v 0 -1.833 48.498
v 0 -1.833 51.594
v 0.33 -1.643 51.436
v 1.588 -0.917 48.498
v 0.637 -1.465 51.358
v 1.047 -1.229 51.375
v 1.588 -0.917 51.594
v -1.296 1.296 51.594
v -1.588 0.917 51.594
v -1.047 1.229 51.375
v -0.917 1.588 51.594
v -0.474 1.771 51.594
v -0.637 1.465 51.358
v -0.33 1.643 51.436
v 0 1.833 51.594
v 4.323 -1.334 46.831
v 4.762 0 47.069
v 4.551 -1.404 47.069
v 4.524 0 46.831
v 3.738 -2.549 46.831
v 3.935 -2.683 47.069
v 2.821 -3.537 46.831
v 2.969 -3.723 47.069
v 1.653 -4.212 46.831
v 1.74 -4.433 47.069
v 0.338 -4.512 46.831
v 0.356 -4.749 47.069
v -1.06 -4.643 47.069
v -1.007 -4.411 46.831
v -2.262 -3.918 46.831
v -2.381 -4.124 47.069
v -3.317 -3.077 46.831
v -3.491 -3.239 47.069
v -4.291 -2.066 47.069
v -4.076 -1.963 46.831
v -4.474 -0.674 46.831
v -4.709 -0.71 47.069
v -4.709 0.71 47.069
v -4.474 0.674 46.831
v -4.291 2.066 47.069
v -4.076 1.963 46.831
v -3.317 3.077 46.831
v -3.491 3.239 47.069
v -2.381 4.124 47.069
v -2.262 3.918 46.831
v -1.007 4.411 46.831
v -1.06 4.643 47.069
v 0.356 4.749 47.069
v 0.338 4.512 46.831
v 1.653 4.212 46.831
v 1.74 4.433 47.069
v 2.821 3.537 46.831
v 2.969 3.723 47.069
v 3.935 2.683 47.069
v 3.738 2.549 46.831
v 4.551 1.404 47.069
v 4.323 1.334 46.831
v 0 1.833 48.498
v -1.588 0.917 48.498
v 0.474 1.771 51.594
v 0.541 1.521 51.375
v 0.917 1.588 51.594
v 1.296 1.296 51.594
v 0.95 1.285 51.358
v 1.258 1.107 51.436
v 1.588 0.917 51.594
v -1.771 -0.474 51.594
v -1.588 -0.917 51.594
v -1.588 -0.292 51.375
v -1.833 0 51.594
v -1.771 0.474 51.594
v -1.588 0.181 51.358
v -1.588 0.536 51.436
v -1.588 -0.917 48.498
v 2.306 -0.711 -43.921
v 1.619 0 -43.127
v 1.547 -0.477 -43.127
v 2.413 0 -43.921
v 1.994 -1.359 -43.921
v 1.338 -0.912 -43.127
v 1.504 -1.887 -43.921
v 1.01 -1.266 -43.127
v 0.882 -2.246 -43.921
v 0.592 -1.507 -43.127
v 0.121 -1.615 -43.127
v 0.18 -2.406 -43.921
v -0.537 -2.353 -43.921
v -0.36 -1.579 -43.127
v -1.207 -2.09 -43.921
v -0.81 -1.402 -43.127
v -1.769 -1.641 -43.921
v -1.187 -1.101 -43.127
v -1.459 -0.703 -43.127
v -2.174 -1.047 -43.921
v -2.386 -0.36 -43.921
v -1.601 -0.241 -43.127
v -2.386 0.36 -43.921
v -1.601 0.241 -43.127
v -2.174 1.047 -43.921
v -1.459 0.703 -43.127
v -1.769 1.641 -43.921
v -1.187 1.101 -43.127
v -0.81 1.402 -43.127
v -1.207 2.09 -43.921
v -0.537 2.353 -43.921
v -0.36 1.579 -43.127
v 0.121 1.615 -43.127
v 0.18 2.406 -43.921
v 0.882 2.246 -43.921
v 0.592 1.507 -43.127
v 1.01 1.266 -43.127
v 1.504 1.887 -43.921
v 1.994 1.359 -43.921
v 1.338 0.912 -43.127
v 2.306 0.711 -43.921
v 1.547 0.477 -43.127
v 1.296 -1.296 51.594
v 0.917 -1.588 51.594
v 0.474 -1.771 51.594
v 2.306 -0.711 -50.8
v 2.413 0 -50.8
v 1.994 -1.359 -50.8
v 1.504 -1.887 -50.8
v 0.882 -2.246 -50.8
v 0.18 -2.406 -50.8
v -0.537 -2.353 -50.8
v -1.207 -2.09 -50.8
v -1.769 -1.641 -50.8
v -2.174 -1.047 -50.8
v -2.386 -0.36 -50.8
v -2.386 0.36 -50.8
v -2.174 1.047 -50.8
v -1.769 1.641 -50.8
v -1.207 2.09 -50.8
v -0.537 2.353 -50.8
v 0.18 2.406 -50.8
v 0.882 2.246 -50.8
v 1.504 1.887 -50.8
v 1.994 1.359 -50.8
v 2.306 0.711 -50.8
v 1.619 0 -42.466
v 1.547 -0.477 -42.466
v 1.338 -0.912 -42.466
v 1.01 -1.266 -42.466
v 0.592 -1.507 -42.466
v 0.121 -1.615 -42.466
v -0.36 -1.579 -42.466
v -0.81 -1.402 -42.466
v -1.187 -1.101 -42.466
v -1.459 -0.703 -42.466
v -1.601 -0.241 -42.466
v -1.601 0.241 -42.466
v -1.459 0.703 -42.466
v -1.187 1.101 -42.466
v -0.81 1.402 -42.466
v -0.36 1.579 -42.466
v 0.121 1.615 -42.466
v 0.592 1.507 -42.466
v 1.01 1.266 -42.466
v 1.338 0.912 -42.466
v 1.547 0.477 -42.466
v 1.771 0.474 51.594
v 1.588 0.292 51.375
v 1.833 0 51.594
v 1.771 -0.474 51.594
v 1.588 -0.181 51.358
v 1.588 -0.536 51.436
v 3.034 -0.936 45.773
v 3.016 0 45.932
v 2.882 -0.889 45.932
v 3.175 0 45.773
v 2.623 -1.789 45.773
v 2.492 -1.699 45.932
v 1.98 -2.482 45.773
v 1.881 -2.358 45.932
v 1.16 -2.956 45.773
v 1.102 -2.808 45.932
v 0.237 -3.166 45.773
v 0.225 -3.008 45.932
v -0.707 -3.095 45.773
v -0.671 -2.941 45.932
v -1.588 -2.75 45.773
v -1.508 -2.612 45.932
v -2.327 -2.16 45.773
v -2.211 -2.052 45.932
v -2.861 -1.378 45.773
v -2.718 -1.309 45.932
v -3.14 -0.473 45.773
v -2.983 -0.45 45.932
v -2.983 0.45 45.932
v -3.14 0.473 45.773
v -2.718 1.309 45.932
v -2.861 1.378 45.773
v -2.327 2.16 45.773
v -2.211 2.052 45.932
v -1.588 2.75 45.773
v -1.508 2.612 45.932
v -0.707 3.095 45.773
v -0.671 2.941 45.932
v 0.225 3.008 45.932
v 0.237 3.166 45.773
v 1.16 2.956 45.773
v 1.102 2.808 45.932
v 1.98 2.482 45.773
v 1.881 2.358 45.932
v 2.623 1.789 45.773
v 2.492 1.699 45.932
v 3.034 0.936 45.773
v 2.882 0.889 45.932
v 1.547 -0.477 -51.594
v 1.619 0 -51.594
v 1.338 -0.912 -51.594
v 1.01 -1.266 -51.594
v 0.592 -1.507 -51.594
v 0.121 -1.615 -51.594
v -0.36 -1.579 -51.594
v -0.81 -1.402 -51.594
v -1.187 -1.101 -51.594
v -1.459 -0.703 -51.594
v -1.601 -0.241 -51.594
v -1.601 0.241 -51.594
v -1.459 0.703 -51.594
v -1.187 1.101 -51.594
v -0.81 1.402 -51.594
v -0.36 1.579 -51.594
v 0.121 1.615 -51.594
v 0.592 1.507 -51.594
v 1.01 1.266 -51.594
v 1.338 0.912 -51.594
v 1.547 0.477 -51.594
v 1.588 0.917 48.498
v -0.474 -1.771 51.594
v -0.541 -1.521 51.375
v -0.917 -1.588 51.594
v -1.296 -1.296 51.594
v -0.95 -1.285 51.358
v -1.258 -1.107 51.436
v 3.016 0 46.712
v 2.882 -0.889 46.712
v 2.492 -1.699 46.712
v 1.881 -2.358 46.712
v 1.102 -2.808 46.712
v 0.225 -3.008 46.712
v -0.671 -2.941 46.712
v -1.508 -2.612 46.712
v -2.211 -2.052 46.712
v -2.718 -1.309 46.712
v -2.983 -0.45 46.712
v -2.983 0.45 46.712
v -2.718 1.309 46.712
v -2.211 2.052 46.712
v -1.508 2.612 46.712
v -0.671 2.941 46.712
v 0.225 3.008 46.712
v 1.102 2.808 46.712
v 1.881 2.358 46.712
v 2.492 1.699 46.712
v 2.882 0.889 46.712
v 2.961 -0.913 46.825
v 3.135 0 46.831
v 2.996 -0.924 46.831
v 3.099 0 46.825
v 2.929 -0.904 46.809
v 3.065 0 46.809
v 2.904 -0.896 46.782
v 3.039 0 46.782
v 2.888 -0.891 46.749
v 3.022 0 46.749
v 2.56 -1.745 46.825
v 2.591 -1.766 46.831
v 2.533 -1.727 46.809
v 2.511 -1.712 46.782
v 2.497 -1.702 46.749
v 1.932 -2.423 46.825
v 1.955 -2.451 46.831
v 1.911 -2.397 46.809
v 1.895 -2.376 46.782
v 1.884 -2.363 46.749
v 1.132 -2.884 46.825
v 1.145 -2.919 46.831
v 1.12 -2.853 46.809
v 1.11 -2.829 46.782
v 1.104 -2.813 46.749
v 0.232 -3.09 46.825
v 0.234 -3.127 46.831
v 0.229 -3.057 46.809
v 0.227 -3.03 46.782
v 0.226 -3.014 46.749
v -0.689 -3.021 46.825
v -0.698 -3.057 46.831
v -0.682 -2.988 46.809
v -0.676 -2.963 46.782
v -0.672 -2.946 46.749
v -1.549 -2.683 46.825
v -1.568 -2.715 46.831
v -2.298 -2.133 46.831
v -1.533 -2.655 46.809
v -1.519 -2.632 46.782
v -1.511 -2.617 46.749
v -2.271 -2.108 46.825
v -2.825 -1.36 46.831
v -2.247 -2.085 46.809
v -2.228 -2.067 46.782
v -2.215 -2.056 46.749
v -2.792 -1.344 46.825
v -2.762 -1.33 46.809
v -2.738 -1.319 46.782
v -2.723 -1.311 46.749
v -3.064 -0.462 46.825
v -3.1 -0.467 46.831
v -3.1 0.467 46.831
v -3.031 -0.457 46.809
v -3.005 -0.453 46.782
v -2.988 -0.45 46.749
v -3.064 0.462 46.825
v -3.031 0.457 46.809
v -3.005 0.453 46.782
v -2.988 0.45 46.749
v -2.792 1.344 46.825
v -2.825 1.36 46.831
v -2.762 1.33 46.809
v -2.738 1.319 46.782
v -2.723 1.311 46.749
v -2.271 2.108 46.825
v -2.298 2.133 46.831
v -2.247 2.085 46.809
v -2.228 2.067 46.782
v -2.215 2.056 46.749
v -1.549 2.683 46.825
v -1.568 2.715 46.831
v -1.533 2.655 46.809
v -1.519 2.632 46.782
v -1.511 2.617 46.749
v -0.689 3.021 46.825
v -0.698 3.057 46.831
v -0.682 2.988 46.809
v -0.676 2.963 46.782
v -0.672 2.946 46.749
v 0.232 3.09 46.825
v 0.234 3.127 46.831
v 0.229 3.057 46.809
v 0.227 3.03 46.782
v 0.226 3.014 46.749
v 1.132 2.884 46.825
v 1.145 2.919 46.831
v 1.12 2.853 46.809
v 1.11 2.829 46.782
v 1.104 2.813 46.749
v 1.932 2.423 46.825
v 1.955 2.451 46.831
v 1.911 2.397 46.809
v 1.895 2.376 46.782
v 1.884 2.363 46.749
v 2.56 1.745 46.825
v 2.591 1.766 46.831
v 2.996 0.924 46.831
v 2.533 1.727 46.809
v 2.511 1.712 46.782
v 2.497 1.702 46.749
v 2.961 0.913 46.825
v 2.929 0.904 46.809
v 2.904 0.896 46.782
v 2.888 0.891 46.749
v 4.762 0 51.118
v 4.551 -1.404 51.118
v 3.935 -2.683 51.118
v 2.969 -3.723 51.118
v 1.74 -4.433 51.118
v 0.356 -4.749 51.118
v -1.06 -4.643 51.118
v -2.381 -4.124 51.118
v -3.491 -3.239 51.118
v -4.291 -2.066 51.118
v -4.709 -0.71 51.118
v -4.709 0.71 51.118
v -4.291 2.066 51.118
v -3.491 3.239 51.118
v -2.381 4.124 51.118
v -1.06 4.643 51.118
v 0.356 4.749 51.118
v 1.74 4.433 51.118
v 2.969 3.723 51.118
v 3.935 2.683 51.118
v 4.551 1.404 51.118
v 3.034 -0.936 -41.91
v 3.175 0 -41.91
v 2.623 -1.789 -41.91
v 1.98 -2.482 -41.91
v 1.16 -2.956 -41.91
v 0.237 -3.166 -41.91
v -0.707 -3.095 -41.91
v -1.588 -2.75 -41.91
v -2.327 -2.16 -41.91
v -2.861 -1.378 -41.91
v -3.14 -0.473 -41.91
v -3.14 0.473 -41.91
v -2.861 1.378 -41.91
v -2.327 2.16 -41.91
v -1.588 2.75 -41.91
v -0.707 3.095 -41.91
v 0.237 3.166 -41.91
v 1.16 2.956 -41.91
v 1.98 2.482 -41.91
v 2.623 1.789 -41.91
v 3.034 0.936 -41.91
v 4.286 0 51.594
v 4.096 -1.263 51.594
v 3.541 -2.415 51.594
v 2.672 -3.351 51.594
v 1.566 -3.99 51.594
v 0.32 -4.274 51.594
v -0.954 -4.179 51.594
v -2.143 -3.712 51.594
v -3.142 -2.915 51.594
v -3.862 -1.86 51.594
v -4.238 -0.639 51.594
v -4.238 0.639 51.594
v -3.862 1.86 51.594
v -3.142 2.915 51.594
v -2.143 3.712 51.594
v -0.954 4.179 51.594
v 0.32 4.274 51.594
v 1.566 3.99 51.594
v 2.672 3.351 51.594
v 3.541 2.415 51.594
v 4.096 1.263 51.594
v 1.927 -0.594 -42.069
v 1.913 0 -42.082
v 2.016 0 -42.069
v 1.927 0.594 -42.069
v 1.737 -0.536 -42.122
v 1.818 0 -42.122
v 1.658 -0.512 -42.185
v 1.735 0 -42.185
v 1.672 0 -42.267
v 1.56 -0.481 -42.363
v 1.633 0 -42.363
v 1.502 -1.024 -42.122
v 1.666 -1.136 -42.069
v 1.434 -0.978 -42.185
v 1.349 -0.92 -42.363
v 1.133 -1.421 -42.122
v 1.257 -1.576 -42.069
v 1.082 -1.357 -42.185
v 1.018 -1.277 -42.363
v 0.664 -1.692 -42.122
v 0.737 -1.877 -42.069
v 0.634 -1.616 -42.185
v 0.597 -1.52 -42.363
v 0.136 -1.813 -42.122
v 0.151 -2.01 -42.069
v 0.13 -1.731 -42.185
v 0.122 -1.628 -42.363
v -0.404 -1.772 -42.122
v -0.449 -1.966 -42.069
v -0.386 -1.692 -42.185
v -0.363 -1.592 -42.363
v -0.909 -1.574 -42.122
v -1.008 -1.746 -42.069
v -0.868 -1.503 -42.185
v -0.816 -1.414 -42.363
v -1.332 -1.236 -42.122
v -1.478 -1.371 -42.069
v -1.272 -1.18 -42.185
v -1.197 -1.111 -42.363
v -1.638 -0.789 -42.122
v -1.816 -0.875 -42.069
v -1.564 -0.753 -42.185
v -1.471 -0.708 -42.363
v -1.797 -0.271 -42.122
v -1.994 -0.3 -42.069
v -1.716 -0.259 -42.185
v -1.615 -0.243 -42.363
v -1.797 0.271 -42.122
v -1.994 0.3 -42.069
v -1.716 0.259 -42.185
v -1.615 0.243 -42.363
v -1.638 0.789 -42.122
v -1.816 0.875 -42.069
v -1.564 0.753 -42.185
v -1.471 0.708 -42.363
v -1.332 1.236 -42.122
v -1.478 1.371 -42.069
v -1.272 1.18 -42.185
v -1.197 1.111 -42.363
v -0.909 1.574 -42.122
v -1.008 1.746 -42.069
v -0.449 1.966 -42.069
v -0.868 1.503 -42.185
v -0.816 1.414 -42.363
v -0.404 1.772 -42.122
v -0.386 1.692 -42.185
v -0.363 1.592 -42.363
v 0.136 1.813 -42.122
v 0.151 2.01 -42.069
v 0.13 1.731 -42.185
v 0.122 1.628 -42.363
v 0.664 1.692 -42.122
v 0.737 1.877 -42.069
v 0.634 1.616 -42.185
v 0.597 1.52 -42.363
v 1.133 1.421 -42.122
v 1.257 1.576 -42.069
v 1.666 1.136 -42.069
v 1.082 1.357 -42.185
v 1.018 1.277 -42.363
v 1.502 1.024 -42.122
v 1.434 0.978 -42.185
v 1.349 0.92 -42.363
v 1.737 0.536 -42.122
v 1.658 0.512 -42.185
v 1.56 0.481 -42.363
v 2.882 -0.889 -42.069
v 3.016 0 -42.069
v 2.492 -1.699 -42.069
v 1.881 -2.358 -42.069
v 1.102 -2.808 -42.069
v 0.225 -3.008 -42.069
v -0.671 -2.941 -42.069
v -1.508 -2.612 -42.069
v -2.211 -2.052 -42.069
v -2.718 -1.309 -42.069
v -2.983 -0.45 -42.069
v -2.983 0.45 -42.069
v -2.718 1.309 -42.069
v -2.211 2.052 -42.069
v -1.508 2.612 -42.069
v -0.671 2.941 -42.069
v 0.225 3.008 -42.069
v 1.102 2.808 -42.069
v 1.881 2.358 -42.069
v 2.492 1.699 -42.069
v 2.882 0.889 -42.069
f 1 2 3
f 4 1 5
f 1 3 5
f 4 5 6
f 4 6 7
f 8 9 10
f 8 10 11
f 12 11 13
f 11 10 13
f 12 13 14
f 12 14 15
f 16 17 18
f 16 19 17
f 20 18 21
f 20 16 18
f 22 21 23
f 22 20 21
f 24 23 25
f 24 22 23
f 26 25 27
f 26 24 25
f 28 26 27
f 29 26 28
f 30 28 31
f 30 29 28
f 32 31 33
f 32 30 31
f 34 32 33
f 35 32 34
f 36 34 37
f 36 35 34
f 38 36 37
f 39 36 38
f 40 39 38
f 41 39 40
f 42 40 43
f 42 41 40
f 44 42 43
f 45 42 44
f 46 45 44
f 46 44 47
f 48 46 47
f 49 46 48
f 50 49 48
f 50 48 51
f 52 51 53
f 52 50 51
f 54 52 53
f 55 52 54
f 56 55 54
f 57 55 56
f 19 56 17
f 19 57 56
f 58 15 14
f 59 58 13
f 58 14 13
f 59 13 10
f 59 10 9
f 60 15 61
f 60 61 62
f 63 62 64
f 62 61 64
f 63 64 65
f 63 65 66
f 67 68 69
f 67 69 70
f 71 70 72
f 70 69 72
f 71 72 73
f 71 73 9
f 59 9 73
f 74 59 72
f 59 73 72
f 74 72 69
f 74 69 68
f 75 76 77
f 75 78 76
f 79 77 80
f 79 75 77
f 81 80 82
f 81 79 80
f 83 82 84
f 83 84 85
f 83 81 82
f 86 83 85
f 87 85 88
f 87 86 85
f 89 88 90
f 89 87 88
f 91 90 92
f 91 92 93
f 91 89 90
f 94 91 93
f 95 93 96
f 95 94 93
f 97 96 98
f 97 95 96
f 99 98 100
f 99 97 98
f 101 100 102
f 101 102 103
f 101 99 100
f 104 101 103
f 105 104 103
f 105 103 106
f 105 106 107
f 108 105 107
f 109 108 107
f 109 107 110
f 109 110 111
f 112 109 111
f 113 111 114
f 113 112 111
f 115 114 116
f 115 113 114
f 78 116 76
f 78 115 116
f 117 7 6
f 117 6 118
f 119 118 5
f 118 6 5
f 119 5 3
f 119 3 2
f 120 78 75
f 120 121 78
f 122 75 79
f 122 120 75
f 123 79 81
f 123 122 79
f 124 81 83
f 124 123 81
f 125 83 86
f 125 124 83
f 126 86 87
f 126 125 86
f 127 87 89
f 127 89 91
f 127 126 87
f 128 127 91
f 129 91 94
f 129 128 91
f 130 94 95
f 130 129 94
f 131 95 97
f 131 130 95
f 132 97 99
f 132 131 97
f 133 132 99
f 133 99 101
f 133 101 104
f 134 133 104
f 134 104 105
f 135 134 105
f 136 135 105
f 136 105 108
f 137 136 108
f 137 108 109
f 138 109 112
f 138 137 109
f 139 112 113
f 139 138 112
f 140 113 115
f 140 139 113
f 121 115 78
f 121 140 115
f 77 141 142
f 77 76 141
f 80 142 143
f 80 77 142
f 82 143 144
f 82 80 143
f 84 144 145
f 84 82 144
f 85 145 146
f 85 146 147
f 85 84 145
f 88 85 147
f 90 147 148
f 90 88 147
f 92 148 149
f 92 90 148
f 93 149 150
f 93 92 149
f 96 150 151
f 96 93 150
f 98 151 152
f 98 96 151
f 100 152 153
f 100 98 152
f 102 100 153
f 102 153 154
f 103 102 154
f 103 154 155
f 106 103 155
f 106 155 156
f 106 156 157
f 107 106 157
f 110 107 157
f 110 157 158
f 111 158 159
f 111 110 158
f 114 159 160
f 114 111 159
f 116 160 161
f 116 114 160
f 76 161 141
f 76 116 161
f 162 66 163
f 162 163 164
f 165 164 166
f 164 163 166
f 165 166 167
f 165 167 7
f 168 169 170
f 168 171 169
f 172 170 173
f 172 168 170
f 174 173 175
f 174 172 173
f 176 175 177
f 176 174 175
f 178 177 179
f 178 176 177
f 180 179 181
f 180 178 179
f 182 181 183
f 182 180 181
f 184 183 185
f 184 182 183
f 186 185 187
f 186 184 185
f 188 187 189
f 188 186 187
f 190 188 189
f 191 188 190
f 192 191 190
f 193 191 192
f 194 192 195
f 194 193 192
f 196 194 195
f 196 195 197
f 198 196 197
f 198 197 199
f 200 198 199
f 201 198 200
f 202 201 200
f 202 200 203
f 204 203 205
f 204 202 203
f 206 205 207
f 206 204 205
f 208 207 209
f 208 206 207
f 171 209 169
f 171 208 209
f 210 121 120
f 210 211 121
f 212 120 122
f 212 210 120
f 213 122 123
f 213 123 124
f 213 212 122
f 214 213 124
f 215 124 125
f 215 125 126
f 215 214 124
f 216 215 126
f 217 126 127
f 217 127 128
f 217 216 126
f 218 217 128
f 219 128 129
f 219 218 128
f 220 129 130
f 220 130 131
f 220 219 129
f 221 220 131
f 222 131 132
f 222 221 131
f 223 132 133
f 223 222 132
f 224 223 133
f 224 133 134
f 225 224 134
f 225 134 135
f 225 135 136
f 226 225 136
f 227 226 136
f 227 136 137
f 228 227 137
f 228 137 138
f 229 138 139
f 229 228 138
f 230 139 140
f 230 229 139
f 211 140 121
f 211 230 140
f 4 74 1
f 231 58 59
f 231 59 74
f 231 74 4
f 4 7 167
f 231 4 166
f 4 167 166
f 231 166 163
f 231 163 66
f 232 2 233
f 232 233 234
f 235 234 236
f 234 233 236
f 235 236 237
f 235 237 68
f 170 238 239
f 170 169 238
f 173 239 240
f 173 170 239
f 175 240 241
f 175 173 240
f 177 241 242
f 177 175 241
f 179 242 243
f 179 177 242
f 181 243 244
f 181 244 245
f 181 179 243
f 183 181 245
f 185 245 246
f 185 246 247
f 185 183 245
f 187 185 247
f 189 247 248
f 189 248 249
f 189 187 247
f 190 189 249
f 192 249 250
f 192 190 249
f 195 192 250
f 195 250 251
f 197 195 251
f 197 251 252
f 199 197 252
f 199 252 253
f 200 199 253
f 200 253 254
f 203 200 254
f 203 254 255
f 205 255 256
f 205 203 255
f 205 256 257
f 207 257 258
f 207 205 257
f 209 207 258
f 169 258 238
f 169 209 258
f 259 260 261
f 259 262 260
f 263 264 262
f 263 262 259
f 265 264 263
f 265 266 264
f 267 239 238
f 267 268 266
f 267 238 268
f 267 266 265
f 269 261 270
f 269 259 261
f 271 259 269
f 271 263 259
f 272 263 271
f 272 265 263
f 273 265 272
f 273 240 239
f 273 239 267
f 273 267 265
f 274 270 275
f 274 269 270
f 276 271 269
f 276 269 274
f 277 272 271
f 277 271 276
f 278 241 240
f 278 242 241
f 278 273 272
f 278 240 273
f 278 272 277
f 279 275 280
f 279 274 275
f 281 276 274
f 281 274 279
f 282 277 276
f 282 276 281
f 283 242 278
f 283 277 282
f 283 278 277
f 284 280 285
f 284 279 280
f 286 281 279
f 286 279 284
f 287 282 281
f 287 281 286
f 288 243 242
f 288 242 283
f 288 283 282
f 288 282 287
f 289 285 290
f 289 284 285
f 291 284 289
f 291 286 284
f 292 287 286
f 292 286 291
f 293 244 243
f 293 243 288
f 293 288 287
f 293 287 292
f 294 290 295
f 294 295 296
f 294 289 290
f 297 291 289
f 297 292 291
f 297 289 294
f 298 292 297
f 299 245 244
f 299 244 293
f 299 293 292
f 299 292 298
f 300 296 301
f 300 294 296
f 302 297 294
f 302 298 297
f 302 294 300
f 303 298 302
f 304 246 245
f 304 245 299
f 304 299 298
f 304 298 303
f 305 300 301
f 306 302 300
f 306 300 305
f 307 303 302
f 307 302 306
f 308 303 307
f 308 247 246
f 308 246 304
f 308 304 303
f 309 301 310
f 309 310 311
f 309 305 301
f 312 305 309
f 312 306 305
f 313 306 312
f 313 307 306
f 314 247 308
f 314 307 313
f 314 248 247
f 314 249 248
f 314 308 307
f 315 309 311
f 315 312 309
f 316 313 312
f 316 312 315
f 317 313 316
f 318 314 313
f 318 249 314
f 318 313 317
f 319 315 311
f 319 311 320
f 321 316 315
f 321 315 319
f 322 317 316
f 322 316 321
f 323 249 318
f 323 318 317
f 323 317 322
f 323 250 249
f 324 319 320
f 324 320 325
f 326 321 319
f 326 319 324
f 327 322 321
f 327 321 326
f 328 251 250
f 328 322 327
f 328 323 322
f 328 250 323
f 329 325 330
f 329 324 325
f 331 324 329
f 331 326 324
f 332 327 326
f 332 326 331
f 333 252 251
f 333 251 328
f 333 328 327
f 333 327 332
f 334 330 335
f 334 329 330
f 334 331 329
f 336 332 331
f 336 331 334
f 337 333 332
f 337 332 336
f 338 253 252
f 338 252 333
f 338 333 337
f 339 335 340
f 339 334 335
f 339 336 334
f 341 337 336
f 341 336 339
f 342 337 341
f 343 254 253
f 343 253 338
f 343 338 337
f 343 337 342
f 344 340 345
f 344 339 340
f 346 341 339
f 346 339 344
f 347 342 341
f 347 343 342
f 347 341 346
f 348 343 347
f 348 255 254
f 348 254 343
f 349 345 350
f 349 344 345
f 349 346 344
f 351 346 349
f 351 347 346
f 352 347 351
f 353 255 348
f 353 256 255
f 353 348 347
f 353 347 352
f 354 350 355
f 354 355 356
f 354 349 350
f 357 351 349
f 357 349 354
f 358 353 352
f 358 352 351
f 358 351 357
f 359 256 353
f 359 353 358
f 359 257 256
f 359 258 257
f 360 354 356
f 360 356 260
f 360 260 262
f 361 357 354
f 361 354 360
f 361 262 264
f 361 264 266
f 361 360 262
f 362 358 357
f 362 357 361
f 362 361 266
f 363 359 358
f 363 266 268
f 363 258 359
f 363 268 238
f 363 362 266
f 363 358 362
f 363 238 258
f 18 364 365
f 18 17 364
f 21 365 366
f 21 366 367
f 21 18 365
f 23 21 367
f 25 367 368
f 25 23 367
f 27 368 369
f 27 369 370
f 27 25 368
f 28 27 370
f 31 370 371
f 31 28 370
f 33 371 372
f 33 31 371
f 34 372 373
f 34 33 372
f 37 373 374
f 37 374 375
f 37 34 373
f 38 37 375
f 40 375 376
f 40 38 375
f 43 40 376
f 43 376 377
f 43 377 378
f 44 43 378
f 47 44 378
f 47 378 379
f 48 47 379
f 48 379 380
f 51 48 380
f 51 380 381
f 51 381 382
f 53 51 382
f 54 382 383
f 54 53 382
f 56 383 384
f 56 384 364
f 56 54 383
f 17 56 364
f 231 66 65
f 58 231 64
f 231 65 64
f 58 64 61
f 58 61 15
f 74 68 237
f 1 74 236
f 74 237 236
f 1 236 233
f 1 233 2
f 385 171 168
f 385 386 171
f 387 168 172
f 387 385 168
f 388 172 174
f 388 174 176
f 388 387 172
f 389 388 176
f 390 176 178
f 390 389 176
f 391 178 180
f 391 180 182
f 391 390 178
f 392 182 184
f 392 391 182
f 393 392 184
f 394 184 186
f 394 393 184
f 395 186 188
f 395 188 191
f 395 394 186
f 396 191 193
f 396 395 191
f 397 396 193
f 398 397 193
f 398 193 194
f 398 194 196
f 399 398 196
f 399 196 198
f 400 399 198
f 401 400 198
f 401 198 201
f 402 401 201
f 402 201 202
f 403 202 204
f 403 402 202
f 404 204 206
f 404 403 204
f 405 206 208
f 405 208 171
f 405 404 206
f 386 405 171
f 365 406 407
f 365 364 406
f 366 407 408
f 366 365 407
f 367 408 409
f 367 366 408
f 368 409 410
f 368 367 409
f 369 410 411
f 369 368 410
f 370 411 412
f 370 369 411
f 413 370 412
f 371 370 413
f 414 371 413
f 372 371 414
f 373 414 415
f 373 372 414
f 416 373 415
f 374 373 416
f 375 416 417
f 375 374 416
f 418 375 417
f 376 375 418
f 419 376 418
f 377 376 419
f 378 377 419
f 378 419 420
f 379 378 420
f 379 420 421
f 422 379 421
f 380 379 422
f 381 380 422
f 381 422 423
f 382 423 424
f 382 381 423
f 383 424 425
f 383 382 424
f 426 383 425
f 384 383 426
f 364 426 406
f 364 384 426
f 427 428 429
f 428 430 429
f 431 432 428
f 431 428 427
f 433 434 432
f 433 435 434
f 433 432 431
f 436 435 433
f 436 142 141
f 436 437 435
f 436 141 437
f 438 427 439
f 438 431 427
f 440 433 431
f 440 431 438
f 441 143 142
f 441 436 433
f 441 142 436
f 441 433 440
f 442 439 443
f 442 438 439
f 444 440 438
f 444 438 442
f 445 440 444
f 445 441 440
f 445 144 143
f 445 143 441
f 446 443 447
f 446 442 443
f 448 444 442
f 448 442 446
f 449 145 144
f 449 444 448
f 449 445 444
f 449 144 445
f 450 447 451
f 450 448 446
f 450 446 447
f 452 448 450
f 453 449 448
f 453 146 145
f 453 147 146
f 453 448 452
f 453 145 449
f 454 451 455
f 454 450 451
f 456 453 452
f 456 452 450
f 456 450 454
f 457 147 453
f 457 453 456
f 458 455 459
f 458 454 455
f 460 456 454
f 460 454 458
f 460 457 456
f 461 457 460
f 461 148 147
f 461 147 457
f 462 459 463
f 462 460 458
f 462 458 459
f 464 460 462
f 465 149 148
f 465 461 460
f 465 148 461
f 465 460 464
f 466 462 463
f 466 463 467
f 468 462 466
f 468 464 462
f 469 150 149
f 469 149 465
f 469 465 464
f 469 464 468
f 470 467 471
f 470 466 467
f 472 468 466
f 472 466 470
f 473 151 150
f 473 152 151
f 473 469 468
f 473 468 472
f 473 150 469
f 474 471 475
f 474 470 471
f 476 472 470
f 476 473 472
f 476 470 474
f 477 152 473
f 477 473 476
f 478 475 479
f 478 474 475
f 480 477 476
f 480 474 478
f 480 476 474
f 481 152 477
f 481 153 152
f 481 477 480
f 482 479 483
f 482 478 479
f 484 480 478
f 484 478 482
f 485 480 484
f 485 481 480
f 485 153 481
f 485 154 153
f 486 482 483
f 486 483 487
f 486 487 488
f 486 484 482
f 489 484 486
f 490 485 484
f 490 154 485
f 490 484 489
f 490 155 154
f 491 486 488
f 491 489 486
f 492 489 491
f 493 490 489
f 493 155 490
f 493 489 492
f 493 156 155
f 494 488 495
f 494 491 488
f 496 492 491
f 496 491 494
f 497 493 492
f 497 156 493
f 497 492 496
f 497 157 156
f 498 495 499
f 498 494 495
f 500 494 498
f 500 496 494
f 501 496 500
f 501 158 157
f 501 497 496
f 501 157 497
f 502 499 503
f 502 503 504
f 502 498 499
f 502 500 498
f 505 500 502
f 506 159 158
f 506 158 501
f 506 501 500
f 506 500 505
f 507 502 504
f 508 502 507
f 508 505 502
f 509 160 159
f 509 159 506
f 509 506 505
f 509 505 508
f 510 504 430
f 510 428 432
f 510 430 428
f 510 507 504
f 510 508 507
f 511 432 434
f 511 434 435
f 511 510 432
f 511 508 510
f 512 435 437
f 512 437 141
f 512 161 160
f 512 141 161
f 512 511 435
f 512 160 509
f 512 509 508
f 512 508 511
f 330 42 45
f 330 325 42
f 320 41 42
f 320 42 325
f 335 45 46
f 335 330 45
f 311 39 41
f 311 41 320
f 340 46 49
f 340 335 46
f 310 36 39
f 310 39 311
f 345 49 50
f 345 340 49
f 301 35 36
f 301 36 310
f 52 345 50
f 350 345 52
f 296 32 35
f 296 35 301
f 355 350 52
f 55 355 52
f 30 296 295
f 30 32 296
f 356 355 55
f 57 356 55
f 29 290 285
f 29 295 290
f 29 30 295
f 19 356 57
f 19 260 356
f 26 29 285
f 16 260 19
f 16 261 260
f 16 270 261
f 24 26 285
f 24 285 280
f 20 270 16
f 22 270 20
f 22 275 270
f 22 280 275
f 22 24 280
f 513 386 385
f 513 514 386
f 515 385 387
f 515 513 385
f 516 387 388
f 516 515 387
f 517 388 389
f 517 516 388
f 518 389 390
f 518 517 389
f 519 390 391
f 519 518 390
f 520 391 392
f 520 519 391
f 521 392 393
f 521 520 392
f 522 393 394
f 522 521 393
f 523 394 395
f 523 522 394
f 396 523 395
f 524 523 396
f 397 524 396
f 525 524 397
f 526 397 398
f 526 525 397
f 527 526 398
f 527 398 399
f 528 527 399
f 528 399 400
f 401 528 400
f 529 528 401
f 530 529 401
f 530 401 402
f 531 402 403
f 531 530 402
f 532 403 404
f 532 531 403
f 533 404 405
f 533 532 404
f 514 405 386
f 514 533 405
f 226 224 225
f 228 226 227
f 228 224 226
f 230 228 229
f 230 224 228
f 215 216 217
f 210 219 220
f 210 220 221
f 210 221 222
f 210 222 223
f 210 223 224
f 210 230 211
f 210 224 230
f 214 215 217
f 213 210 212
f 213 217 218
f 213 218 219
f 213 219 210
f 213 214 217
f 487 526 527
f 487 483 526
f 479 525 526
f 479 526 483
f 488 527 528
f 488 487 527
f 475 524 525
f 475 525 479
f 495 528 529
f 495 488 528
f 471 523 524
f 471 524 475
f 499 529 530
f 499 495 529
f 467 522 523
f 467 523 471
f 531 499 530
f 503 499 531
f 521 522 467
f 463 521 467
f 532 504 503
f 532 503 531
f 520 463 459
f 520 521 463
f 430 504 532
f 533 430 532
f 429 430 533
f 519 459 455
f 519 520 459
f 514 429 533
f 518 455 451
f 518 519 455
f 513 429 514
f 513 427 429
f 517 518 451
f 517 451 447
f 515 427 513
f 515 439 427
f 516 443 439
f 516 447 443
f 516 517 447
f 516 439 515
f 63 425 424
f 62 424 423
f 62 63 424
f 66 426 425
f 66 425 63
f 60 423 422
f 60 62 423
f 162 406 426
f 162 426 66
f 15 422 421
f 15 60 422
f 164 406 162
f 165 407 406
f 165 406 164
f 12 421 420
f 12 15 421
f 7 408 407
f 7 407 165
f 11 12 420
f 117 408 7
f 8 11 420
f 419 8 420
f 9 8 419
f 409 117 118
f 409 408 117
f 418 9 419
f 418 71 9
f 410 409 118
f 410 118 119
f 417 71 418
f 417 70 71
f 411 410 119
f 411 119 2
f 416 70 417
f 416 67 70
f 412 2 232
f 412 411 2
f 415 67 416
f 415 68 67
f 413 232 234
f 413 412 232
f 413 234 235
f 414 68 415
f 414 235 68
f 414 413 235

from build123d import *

# Parameters (mm, degrees)
CUT_EXTRUDE1_DEPTH = 3.095625


with BuildPart() as part:
    # Sketch3 → Revolve1 (revolve)
    with BuildSketch(Plane(origin=(0, 0, 0), x_dir=(0, 0, -1), z_dir=(1, 0, 0)), mode=Mode.PRIVATE) as revolve1_sk:
        with BuildLine():
            Line((-51.59375, 0), (-51.59375, 4.28625))
            Line((-51.59375, 4.28625), (-51.1175, 4.7625))
            Line((-51.1175, 4.7625), (-47.069375, 4.7625))
            Line((-47.069375, 4.7625), (-46.83125, 4.524375))
            Line((-46.83125, 4.524375), (-46.83125, 3.1353125))
            ThreePointArc((-46.83125, 3.1353125), (-46.796377401, 3.051122599), (-46.7121875, 3.01625))
            Line((-46.7121875, 3.01625), (-45.931666667, 3.01625))
            Line((-45.931666667, 3.01625), (-45.772916667, 3.175))
            Line((-45.772916667, 3.175), (41.91, 3.175))
            Line((41.91, 3.175), (42.06875, 3.01625))
            Line((42.06875, 3.01625), (42.06875, 2.016125))
            ThreePointArc((42.06875, 2.016125), (42.184991996, 1.735491996), (42.465625, 1.61925))
            Line((42.465625, 1.61925), (43.127083333, 1.61925))
            Line((43.127083333, 1.61925), (43.920833333, 2.413))
            Line((43.920833333, 2.413), (50.8, 2.413))
            Line((50.8, 2.413), (51.59375, 1.61925))
            Line((51.59375, 1.61925), (51.59375, 0))
            Line((51.59375, 0), (-51.59375, 0))
        make_face()
    revolve(revolve1_sk.sketch.rotate(Axis((0, 0, 51.59375), (0, 0, -1)), 90), axis=Axis((0, 0, 51.59375), (0, 0, -1)))

    # Sketch4 → Cut-Extrude1 (cut)
    with BuildSketch(Plane.XY.offset(51.59375)):
        Polygon((-1.5875, -0.916543552), (0, -1.833087105), (1.5875, -0.916543552), (1.5875, 0.916543552), (0, 1.833087105), (-1.5875, 0.916543552), align=None)
    extrude(amount=-CUT_EXTRUDE1_DEPTH, mode=Mode.SUBTRACT)

    # Cut-Extrude2 cone 1 section (through the dimple's axis) → Cut-Extrude2 (revolve, cut)
    with BuildSketch(Plane(origin=(0, 0, 51.59375), x_dir=(0, -1, 0), z_dir=(1, 0, 0))):
        Polygon((0, 0), (1.833087105, 0), (0, 1.833087105), align=None)
    revolve(axis=Axis((0, 0, 51.59375), (0, 0, -1)), mode=Mode.SUBTRACT)


solid = part.part
